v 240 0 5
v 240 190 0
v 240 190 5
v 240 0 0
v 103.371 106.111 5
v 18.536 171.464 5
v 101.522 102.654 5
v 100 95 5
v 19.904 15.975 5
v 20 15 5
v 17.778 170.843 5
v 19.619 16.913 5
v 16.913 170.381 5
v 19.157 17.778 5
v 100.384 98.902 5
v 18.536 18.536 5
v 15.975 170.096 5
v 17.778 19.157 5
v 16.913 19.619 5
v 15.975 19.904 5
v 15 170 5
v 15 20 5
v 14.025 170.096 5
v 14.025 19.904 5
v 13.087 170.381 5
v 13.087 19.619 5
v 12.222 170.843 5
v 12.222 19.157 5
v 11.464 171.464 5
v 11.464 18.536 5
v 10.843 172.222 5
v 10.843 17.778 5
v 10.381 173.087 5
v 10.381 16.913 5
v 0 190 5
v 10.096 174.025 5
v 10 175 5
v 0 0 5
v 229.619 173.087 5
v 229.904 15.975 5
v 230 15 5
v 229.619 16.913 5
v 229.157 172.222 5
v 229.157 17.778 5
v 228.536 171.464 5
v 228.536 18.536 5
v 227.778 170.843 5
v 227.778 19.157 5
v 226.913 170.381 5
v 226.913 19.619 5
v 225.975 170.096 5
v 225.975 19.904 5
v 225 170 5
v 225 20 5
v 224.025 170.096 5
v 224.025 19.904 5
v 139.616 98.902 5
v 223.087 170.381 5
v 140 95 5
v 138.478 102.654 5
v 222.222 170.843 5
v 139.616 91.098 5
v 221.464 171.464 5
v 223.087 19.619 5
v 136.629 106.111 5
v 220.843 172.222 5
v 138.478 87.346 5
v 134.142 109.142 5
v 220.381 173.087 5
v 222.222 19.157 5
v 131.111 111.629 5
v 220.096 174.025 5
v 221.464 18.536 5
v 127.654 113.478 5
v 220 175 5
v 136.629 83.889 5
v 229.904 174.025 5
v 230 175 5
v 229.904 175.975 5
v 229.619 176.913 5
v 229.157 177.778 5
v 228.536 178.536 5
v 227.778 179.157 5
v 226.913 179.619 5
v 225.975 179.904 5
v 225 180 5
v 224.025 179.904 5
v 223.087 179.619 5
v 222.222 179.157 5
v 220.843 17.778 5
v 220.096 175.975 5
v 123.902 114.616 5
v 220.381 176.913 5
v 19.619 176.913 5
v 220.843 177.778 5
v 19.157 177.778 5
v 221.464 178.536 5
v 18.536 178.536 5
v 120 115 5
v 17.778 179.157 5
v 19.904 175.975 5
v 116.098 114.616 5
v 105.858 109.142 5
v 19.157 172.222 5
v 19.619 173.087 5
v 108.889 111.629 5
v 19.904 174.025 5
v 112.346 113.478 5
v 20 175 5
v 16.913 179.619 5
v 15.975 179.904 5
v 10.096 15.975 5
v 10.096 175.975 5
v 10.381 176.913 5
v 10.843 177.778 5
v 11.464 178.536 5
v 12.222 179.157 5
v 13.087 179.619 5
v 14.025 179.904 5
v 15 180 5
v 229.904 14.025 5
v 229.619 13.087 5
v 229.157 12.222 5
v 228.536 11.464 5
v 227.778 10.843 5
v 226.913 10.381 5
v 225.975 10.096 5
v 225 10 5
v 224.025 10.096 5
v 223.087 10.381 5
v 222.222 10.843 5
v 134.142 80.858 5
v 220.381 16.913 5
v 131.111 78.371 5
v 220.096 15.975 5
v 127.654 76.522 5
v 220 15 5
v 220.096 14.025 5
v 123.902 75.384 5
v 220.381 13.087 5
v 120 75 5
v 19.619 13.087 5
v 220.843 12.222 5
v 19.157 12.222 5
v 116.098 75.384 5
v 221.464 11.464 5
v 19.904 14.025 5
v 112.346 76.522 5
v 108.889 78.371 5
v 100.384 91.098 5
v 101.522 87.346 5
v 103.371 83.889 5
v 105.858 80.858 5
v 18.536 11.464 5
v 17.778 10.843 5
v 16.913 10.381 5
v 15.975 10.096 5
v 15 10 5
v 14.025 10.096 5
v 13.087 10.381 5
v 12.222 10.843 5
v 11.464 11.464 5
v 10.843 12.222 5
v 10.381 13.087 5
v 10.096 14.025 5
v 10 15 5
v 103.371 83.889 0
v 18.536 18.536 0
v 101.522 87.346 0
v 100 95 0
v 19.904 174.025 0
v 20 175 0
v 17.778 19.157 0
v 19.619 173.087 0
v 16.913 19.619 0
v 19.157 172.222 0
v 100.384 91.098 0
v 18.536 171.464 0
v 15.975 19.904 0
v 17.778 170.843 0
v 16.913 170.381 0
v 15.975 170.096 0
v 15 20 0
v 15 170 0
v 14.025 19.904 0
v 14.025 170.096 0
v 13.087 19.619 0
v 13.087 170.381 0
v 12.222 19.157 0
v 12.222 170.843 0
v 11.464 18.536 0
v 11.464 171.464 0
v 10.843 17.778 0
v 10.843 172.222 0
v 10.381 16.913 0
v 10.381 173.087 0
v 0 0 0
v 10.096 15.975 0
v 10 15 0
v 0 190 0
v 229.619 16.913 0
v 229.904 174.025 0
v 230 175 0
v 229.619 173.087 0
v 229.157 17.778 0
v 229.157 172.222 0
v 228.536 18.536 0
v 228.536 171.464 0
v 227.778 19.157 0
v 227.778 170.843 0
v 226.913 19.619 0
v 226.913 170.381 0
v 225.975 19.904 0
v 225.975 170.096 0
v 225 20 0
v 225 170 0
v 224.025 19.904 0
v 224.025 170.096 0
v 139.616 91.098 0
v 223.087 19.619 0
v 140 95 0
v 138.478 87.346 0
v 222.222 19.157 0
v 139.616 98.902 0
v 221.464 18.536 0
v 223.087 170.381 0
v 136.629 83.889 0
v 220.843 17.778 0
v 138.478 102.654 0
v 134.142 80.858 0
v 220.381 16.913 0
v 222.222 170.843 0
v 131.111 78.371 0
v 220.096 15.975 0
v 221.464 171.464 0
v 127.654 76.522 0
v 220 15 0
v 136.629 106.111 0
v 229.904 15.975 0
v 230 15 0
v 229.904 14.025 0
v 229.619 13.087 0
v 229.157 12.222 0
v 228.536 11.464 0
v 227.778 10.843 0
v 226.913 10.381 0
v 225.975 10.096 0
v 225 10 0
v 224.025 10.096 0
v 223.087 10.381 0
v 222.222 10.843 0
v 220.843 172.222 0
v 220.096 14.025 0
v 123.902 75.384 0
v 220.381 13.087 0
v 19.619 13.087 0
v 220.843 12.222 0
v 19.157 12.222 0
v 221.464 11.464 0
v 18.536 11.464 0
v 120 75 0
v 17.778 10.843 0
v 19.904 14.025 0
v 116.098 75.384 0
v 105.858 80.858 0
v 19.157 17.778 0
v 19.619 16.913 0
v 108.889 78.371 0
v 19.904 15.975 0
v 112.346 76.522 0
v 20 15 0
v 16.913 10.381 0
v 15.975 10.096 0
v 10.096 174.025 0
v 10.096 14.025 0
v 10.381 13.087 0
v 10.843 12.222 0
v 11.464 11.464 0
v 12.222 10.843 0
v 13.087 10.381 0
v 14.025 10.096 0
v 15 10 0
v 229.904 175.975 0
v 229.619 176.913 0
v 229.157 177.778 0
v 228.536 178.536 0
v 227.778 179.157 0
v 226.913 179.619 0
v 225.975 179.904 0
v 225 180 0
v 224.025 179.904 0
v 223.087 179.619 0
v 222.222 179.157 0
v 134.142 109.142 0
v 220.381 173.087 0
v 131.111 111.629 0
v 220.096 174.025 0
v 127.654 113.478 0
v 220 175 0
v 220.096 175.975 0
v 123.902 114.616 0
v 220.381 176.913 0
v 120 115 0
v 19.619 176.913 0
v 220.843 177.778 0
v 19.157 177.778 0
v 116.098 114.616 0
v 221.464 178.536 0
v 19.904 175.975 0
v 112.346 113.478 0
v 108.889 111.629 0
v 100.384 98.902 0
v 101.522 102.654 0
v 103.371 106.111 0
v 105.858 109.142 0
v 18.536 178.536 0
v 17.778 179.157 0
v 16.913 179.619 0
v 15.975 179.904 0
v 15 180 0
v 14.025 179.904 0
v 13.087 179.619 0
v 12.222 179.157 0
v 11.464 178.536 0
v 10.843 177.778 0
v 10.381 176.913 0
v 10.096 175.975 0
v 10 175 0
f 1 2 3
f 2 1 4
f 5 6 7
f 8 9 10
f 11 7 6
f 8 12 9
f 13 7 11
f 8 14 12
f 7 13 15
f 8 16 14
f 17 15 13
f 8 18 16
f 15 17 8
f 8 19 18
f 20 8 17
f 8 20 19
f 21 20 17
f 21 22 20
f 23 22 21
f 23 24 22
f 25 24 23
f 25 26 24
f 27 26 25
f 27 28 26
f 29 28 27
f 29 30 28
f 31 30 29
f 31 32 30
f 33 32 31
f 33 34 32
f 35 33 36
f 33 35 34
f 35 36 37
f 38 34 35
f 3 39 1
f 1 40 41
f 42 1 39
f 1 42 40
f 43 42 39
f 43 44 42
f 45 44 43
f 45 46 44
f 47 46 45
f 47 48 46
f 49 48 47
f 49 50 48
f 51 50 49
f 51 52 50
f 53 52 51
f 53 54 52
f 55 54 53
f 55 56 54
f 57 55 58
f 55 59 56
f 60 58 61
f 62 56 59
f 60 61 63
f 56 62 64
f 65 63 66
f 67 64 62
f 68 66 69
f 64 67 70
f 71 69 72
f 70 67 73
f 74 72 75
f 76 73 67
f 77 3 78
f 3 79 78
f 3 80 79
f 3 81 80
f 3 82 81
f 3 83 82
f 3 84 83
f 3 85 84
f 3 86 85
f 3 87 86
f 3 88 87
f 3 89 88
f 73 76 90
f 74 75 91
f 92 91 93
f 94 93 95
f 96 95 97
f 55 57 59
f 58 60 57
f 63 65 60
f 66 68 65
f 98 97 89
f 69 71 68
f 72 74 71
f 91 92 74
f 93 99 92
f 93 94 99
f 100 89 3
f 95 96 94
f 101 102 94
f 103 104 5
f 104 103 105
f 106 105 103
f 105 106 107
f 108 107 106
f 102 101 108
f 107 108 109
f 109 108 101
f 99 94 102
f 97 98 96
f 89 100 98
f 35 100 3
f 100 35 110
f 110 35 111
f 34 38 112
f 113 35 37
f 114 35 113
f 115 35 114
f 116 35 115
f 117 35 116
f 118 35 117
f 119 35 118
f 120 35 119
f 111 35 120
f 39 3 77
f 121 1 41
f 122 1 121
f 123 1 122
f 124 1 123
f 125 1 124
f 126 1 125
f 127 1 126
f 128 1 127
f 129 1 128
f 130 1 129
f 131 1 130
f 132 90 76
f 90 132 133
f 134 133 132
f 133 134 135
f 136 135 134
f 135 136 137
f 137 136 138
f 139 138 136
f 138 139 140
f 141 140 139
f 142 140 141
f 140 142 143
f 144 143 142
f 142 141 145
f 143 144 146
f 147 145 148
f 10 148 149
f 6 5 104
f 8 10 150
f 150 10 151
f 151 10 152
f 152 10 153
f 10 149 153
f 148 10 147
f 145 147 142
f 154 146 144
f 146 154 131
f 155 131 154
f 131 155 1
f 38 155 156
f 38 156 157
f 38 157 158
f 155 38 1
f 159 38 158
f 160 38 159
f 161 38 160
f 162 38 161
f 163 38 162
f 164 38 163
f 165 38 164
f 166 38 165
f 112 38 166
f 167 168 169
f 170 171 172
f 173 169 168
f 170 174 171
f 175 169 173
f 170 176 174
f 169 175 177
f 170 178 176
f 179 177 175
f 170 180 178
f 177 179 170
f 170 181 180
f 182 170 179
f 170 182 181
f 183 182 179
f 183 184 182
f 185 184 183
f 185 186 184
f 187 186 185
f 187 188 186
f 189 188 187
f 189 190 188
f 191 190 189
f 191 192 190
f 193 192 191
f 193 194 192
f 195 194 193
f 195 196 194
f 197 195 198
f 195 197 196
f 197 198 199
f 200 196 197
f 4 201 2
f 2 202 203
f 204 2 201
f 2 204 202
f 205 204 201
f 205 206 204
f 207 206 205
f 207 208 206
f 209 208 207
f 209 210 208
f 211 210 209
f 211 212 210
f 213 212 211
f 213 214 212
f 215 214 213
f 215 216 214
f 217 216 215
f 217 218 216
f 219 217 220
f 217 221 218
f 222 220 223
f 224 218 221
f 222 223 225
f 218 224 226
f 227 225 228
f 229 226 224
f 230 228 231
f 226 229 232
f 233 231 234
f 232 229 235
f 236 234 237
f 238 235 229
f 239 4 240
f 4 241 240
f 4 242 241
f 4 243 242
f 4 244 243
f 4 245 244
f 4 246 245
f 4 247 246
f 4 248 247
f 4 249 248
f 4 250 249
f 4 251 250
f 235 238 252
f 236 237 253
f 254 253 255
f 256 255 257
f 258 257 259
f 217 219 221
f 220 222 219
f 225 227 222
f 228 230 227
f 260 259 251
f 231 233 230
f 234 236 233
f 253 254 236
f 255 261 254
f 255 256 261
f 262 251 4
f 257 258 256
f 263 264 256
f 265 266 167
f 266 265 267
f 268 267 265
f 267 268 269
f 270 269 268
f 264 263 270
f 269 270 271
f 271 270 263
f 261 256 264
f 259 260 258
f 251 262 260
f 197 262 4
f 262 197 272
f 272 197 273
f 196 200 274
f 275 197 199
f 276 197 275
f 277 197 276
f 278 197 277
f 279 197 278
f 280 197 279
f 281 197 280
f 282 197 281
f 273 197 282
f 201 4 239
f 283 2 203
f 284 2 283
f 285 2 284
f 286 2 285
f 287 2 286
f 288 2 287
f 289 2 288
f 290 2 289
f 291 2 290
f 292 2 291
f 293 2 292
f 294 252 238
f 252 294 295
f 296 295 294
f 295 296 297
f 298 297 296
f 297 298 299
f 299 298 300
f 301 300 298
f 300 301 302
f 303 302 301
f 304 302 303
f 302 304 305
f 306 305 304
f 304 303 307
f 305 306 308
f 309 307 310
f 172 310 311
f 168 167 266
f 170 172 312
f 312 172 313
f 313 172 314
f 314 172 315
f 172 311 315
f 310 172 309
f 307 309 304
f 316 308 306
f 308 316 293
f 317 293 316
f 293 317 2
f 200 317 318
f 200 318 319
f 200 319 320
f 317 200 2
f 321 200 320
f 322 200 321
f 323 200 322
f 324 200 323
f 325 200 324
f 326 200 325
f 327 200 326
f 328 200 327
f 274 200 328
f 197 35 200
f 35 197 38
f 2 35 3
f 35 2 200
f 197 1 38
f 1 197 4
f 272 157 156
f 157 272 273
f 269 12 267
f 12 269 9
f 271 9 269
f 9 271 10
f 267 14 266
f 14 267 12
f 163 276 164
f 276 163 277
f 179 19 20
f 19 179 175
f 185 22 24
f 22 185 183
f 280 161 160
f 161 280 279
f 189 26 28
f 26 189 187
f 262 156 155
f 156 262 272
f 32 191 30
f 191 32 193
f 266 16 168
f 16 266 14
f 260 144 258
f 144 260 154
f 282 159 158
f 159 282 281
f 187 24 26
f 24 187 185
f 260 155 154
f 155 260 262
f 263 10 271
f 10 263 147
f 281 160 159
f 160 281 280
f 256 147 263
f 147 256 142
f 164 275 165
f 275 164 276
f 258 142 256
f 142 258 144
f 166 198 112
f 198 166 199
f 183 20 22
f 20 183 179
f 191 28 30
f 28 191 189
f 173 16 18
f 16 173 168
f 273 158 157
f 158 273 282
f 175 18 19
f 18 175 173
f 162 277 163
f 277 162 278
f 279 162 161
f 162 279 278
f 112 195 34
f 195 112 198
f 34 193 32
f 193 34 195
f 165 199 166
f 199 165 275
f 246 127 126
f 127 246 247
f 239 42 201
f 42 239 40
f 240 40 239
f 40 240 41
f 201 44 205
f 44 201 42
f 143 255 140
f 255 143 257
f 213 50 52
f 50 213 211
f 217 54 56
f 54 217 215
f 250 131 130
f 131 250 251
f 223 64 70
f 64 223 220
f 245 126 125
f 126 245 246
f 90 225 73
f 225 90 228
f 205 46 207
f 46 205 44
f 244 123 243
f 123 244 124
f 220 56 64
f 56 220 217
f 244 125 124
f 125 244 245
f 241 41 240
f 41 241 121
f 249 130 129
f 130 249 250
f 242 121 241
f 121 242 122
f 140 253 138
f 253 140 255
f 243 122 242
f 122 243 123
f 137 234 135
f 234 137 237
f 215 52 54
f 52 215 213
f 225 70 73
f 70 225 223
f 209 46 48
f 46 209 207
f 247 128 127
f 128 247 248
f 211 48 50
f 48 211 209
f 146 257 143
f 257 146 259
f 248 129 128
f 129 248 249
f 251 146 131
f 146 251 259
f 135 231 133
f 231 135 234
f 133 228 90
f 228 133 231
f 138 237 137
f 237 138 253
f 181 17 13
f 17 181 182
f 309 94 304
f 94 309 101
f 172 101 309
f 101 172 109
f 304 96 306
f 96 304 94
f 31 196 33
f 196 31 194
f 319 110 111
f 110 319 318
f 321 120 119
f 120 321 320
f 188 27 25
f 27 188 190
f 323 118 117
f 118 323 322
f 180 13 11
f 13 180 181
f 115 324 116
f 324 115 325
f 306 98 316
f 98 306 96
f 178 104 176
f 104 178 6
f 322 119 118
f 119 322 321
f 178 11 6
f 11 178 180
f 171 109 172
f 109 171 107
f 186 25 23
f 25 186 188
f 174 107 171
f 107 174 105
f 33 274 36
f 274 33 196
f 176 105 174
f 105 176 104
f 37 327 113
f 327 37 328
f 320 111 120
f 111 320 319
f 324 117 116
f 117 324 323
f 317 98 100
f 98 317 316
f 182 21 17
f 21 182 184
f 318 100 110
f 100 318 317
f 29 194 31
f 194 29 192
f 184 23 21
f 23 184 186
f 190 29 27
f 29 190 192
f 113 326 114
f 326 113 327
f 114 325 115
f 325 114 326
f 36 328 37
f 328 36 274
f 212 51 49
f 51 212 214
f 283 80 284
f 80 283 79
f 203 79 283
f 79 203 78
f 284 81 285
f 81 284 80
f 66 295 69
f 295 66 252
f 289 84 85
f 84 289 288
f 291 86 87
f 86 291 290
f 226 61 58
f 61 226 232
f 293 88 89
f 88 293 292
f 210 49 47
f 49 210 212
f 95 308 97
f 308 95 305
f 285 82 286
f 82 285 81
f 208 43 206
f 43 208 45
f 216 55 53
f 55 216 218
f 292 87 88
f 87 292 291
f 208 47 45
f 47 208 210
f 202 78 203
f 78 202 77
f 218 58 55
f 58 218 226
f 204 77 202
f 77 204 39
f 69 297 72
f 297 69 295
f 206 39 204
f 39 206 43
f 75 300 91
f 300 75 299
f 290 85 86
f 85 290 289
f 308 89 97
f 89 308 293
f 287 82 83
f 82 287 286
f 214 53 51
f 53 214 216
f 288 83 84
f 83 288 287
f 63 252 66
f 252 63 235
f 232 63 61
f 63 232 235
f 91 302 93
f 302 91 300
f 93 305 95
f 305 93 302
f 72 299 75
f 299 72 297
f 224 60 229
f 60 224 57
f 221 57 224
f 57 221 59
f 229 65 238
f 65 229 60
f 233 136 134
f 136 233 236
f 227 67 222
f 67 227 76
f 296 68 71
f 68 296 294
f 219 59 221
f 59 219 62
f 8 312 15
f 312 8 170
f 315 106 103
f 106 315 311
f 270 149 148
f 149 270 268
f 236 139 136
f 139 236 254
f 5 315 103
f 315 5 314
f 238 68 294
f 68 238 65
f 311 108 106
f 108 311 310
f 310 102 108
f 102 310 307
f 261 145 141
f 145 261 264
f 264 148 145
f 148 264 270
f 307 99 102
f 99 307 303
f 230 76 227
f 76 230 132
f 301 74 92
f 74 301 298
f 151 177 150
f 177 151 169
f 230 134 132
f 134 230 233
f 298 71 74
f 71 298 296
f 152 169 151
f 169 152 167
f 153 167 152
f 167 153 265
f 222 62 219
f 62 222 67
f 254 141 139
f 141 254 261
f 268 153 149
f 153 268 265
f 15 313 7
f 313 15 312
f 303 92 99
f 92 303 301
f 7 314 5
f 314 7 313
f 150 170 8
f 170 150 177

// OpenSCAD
$fn = 32;

// ----------------------------------------------------------------------
// Big plate: 200-250 mm adapter plate
// ----------------------------------------------------------------------

// --- parameters (mm) ---
plate_l = 240;            // plate length, X
plate_w = 190;            // plate width, Y
plate_t = 5;              // plate thickness, Z
corner_d = 10;            // corner hole diameter
corner_in = 15;           // corner hole inset from the edges
bore_d = 40;              // central bore

difference() {
  cube([plate_l, plate_w, plate_t]);
  translate([corner_in, corner_in, -1]) cylinder(h = plate_t + 2, d = corner_d);
  translate([plate_l - corner_in, corner_in, -1]) cylinder(h = plate_t + 2, d = corner_d);
  translate([corner_in, plate_w - corner_in, -1]) cylinder(h = plate_t + 2, d = corner_d);
  translate([plate_l - corner_in, plate_w - corner_in, -1]) cylinder(h = plate_t + 2, d = corner_d);
  translate([plate_l / 2, plate_w / 2, -1]) cylinder(h = plate_t + 2, d = bore_d);
}
